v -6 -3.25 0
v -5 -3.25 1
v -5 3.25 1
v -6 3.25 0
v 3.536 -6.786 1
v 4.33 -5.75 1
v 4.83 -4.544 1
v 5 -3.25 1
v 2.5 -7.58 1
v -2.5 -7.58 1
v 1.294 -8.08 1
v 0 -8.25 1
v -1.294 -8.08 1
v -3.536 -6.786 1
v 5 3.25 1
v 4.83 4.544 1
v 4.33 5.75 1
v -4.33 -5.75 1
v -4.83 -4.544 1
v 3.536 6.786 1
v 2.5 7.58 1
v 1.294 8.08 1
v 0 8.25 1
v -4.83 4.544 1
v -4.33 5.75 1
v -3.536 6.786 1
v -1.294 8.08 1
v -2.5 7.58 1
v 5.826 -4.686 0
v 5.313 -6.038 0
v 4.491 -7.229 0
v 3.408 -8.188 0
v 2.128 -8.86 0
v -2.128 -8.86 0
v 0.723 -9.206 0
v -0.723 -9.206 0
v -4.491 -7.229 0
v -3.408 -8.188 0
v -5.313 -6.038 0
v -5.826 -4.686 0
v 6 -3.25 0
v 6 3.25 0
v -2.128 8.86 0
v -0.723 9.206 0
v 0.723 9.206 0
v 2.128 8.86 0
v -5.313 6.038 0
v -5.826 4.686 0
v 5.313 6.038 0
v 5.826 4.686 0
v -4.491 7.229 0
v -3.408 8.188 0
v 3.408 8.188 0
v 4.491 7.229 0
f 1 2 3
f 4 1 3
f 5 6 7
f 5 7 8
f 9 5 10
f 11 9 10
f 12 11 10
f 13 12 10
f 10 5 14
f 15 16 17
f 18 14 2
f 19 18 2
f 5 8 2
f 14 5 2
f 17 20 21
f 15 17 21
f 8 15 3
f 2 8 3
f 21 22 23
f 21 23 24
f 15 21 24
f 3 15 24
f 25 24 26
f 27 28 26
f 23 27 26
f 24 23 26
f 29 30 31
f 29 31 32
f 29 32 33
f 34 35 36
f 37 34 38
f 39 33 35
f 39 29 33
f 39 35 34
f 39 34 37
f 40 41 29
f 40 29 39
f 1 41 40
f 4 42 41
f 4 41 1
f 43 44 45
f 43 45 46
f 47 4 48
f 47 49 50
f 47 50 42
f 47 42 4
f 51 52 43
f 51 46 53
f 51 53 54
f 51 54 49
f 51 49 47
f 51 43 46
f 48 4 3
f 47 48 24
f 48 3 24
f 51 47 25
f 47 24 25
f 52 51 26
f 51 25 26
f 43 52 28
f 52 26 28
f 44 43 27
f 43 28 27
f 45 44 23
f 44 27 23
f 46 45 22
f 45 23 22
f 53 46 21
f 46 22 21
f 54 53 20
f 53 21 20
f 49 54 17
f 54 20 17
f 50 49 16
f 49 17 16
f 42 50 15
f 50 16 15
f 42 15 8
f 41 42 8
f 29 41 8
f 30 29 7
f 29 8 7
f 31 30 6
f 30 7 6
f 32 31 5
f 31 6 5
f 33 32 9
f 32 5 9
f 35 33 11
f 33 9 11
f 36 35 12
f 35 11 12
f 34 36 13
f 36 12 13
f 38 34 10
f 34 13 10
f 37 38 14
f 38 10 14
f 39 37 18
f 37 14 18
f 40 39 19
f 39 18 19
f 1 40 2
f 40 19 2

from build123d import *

# Parameters (mm, degrees)
SALIENTE_EXTRUIR1_DEPTH = 1
CHAFL_N1_SIZE           = 1


with BuildPart() as part:
    # Croquis1 → Saliente-Extruir1 (new body)
    with BuildSketch(Plane.XY):
        with BuildLine():
            Line((-6, -3.25), (-6, 3.25))
            ThreePointArc((-6, 3.25), (0, 9.25), (6, 3.25))
            Line((6, 3.25), (6, -3.25))
            ThreePointArc((6, -3.25), (0, -9.25), (-6, -3.25))
        make_face()
    extrude(amount=SALIENTE_EXTRUIR1_DEPTH)

    # Chaflán1
    chafl_n1_edges = [part.edges().sort_by_distance(p)[0] for p in [
        (0, -9.25, 1),
        (6, 0, 1),
        (-6, 0, 1),
        (0, 9.25, 1),
    ]]
    chamfer(chafl_n1_edges, length=CHAFL_N1_SIZE - 0.0001)  # a hair under: the kernel refuses the full size


solid = part.part
